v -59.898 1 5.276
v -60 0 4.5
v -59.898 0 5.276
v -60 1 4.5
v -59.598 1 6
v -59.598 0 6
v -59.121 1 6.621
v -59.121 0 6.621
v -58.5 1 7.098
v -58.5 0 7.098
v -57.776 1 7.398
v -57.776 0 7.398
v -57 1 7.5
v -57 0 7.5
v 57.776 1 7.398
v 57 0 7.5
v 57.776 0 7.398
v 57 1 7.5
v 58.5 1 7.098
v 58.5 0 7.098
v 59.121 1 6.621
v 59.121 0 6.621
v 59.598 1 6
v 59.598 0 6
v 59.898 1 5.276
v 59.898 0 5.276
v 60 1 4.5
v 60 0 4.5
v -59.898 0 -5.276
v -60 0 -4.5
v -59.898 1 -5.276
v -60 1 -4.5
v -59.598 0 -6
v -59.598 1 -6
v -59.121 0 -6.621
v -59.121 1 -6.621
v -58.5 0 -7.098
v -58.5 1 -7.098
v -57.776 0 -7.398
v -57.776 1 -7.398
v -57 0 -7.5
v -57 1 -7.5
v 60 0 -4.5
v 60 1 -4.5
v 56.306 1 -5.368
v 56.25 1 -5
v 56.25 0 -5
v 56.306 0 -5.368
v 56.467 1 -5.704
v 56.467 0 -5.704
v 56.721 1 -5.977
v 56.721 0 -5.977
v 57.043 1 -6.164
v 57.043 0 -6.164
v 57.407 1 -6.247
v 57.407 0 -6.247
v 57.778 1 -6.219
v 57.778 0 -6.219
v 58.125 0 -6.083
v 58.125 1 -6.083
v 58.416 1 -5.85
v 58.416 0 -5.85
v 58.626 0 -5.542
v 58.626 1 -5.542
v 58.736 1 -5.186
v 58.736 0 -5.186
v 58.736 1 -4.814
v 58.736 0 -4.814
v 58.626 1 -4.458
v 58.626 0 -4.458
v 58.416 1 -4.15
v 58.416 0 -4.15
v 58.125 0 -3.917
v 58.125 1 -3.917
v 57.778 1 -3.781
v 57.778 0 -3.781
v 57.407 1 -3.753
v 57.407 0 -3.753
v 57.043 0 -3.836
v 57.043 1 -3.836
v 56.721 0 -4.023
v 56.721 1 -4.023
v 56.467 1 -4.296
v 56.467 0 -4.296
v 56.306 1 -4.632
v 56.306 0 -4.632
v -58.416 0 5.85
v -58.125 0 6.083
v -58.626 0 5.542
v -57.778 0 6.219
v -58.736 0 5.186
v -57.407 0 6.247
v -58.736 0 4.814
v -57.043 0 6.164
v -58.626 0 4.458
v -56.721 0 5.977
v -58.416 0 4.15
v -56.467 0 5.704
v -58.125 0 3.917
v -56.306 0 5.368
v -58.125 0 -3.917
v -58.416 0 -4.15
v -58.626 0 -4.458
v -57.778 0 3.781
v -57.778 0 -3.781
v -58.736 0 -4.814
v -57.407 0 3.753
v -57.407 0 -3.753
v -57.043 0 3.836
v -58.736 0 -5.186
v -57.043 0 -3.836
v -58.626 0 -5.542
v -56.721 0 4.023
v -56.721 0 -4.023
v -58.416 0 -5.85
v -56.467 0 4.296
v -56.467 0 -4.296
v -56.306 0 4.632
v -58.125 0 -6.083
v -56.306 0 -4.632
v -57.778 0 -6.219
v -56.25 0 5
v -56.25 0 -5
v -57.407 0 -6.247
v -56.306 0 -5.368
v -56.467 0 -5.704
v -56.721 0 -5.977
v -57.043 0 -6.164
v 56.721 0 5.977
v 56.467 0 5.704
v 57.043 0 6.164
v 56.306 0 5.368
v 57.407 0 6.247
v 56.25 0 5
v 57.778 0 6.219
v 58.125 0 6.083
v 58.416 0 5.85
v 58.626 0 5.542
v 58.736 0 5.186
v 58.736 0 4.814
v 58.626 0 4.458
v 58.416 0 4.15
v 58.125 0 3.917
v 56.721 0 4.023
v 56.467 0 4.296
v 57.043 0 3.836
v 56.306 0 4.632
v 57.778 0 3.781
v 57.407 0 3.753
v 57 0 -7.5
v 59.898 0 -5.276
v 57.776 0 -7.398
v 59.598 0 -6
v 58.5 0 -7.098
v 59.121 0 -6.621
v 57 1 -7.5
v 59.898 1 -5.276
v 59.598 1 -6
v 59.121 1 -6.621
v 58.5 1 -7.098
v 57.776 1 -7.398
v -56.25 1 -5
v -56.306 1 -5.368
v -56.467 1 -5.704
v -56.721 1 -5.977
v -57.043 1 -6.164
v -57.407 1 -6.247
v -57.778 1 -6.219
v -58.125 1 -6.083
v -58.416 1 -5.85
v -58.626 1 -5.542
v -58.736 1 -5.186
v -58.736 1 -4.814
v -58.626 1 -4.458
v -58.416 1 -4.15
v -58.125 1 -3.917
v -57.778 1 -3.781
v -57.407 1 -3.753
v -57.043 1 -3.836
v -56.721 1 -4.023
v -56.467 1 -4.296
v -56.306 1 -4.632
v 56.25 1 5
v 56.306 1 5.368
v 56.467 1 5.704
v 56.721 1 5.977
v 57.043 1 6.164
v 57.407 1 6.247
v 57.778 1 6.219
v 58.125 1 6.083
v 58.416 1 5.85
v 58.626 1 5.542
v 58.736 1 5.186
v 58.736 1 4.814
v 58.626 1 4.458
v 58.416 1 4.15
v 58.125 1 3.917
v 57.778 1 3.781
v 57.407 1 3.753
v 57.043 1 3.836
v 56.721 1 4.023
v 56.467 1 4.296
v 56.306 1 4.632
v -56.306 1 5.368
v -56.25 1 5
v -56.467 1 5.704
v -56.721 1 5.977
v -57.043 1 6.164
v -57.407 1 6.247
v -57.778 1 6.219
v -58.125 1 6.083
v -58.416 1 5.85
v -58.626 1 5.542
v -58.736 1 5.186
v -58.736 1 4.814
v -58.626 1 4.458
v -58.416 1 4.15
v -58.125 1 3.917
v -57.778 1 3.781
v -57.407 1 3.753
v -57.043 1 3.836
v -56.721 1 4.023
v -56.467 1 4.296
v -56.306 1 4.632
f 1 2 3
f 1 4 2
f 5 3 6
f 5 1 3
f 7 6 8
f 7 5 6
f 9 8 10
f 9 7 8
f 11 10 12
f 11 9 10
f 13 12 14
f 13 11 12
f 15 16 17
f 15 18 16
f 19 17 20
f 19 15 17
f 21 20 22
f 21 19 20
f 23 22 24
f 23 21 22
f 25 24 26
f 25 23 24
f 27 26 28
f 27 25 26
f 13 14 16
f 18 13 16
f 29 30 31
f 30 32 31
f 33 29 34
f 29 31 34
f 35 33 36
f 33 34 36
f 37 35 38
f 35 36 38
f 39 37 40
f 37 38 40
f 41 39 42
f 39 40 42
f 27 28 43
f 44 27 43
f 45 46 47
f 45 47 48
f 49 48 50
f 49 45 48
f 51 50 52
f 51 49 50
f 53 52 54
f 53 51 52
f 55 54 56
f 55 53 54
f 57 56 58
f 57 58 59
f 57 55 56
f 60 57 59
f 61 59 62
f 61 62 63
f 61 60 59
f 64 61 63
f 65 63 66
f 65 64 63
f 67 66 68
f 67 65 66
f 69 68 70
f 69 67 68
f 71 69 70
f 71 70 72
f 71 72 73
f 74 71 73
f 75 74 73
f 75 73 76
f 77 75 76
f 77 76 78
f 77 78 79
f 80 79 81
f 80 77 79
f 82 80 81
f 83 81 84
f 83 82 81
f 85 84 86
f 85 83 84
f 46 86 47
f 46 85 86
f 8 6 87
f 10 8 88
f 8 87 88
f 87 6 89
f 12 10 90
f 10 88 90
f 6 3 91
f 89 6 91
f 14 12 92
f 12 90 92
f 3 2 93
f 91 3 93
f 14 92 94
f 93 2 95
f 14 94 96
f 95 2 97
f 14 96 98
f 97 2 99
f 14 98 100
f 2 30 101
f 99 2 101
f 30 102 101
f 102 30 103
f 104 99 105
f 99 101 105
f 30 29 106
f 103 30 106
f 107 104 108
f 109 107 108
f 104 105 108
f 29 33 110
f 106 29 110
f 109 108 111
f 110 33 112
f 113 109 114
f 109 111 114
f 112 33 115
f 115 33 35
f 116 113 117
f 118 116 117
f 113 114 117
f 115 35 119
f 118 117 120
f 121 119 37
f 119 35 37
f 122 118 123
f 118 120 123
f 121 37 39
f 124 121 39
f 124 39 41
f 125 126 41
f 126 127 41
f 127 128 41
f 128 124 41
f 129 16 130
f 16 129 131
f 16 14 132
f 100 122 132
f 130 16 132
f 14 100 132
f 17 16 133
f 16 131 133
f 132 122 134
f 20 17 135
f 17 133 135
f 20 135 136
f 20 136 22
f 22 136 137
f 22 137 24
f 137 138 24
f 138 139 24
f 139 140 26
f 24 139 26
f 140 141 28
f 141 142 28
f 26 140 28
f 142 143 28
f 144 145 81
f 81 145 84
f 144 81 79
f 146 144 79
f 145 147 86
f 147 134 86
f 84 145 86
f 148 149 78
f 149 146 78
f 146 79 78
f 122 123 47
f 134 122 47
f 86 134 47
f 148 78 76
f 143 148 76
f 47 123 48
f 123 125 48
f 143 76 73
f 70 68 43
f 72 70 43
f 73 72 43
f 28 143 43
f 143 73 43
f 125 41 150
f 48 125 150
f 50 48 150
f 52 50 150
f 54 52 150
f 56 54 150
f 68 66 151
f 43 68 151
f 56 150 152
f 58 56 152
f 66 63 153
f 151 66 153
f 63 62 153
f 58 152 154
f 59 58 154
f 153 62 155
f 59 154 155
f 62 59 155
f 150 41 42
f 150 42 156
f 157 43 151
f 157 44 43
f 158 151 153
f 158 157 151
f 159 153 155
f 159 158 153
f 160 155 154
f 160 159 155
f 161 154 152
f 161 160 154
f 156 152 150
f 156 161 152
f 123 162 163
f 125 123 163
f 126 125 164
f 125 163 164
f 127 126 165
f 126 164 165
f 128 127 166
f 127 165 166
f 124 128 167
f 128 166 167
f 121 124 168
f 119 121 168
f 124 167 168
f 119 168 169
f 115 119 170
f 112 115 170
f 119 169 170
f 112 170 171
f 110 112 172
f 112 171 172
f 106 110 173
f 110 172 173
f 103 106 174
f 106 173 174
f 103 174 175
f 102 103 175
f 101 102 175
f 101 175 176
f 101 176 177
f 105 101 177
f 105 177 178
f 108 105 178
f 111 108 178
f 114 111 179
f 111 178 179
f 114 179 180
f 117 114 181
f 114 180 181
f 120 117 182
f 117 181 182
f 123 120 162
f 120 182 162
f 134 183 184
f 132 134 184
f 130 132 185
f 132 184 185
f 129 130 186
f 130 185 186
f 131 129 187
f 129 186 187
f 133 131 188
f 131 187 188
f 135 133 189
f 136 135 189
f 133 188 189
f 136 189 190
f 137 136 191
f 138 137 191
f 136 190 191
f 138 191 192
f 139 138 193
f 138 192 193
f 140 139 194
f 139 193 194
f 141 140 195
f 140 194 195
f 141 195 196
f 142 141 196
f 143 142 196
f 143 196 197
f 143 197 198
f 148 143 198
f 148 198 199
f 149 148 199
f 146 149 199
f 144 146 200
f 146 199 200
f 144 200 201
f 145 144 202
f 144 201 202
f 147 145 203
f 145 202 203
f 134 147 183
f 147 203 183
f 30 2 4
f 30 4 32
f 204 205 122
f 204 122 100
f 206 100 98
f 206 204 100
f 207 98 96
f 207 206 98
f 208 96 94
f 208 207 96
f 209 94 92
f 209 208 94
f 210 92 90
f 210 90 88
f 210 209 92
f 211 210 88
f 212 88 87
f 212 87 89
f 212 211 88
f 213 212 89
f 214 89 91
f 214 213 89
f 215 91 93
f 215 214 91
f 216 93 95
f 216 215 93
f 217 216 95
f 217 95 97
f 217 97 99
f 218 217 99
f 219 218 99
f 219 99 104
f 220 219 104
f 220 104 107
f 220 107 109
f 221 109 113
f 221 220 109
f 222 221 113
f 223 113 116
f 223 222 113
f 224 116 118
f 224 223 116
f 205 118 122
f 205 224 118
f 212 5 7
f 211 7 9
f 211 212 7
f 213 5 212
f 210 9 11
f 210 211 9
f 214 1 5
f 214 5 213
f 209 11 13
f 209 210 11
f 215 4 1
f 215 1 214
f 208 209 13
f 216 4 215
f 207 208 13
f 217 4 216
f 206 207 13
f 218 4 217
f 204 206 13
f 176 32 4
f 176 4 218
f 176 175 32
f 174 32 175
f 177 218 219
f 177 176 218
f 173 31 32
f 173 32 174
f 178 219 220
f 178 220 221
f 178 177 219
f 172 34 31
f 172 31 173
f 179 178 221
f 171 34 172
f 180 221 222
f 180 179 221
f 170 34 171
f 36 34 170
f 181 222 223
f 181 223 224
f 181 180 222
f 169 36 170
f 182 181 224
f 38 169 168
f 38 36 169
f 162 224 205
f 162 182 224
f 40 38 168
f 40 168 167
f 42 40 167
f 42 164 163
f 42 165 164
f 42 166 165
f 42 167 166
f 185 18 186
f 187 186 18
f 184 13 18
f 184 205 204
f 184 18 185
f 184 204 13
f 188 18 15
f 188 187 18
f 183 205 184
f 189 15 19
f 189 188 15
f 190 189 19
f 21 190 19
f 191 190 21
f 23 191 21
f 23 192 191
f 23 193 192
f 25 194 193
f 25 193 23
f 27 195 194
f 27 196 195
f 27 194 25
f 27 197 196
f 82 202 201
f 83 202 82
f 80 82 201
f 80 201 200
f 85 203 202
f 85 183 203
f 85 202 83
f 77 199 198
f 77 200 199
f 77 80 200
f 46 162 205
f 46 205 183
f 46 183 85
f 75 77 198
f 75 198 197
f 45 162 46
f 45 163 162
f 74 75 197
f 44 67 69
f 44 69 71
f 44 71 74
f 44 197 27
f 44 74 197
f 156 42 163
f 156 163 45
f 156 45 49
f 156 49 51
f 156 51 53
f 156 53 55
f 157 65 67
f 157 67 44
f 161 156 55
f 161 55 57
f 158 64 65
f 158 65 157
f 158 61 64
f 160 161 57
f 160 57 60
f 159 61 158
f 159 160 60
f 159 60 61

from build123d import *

# Parameters (mm, degrees)
SKETCH1_W               = 120
SKETCH1_H               = 15
BOSS_EXTRUDE1_DEPTH     = 1
FILLET1_R               = 3
SKETCH3_R               = 1.25
CUT_EXTRUDE1_DEPTH      = 1
MIRROR2_COPY_1_SKETCH_R = 1.25
MIRROR2_COPY_1_DEPTH    = 1


with BuildPart() as part:
    # Sketch1 → Boss-Extrude1 (new body)
    with BuildSketch(Plane(origin=(0, 0, 0), x_dir=(1, 0, 0), z_dir=(0, 1, 0))):
        Rectangle(SKETCH1_W, SKETCH1_H)
    extrude(amount=BOSS_EXTRUDE1_DEPTH)

    # Fillet1
    fillet1_edges = [part.edges().sort_by_distance(p)[0] for p in [
        (60, 0.5, 7.5),
        (-60, 0.5, 7.5),
        (-60, 0.5, -7.5),
        (60, 0.5, -7.5),
    ]]
    fillet(fillet1_edges, radius=FILLET1_R)

    # Sketch3 → Cut-Extrude1 (cut)
    with BuildSketch(Plane(origin=(0, 1, 0), x_dir=(1, 0, 0), z_dir=(0, 1, 0))):
        with Locations((-57.5, 5)):
            Circle(SKETCH3_R)
    cut_extrude1 = extrude(amount=-CUT_EXTRUDE1_DEPTH, mode=Mode.SUBTRACT)

    # Mirror1: Cut-Extrude1 across plane
    add(cut_extrude1.mirror(Plane.XY), mode=Mode.SUBTRACT)

    # Mirror2: Cut-Extrude1 across plane
    add(cut_extrude1.mirror(Plane(origin=(0, 0, 0), x_dir=(0, 0, 1), z_dir=(1, 0, 0))), mode=Mode.SUBTRACT)

    # Mirror2 copy 1 sketch → Mirror2 copy 1 (cut)
    with BuildSketch(Plane(origin=(0, 1, 0), x_dir=(-1, 0, 0), z_dir=(0, 1, 0))):
        with Locations((-57.5, 5)):
            Circle(MIRROR2_COPY_1_SKETCH_R)
    extrude(amount=-MIRROR2_COPY_1_DEPTH, mode=Mode.SUBTRACT)


solid = part.part
